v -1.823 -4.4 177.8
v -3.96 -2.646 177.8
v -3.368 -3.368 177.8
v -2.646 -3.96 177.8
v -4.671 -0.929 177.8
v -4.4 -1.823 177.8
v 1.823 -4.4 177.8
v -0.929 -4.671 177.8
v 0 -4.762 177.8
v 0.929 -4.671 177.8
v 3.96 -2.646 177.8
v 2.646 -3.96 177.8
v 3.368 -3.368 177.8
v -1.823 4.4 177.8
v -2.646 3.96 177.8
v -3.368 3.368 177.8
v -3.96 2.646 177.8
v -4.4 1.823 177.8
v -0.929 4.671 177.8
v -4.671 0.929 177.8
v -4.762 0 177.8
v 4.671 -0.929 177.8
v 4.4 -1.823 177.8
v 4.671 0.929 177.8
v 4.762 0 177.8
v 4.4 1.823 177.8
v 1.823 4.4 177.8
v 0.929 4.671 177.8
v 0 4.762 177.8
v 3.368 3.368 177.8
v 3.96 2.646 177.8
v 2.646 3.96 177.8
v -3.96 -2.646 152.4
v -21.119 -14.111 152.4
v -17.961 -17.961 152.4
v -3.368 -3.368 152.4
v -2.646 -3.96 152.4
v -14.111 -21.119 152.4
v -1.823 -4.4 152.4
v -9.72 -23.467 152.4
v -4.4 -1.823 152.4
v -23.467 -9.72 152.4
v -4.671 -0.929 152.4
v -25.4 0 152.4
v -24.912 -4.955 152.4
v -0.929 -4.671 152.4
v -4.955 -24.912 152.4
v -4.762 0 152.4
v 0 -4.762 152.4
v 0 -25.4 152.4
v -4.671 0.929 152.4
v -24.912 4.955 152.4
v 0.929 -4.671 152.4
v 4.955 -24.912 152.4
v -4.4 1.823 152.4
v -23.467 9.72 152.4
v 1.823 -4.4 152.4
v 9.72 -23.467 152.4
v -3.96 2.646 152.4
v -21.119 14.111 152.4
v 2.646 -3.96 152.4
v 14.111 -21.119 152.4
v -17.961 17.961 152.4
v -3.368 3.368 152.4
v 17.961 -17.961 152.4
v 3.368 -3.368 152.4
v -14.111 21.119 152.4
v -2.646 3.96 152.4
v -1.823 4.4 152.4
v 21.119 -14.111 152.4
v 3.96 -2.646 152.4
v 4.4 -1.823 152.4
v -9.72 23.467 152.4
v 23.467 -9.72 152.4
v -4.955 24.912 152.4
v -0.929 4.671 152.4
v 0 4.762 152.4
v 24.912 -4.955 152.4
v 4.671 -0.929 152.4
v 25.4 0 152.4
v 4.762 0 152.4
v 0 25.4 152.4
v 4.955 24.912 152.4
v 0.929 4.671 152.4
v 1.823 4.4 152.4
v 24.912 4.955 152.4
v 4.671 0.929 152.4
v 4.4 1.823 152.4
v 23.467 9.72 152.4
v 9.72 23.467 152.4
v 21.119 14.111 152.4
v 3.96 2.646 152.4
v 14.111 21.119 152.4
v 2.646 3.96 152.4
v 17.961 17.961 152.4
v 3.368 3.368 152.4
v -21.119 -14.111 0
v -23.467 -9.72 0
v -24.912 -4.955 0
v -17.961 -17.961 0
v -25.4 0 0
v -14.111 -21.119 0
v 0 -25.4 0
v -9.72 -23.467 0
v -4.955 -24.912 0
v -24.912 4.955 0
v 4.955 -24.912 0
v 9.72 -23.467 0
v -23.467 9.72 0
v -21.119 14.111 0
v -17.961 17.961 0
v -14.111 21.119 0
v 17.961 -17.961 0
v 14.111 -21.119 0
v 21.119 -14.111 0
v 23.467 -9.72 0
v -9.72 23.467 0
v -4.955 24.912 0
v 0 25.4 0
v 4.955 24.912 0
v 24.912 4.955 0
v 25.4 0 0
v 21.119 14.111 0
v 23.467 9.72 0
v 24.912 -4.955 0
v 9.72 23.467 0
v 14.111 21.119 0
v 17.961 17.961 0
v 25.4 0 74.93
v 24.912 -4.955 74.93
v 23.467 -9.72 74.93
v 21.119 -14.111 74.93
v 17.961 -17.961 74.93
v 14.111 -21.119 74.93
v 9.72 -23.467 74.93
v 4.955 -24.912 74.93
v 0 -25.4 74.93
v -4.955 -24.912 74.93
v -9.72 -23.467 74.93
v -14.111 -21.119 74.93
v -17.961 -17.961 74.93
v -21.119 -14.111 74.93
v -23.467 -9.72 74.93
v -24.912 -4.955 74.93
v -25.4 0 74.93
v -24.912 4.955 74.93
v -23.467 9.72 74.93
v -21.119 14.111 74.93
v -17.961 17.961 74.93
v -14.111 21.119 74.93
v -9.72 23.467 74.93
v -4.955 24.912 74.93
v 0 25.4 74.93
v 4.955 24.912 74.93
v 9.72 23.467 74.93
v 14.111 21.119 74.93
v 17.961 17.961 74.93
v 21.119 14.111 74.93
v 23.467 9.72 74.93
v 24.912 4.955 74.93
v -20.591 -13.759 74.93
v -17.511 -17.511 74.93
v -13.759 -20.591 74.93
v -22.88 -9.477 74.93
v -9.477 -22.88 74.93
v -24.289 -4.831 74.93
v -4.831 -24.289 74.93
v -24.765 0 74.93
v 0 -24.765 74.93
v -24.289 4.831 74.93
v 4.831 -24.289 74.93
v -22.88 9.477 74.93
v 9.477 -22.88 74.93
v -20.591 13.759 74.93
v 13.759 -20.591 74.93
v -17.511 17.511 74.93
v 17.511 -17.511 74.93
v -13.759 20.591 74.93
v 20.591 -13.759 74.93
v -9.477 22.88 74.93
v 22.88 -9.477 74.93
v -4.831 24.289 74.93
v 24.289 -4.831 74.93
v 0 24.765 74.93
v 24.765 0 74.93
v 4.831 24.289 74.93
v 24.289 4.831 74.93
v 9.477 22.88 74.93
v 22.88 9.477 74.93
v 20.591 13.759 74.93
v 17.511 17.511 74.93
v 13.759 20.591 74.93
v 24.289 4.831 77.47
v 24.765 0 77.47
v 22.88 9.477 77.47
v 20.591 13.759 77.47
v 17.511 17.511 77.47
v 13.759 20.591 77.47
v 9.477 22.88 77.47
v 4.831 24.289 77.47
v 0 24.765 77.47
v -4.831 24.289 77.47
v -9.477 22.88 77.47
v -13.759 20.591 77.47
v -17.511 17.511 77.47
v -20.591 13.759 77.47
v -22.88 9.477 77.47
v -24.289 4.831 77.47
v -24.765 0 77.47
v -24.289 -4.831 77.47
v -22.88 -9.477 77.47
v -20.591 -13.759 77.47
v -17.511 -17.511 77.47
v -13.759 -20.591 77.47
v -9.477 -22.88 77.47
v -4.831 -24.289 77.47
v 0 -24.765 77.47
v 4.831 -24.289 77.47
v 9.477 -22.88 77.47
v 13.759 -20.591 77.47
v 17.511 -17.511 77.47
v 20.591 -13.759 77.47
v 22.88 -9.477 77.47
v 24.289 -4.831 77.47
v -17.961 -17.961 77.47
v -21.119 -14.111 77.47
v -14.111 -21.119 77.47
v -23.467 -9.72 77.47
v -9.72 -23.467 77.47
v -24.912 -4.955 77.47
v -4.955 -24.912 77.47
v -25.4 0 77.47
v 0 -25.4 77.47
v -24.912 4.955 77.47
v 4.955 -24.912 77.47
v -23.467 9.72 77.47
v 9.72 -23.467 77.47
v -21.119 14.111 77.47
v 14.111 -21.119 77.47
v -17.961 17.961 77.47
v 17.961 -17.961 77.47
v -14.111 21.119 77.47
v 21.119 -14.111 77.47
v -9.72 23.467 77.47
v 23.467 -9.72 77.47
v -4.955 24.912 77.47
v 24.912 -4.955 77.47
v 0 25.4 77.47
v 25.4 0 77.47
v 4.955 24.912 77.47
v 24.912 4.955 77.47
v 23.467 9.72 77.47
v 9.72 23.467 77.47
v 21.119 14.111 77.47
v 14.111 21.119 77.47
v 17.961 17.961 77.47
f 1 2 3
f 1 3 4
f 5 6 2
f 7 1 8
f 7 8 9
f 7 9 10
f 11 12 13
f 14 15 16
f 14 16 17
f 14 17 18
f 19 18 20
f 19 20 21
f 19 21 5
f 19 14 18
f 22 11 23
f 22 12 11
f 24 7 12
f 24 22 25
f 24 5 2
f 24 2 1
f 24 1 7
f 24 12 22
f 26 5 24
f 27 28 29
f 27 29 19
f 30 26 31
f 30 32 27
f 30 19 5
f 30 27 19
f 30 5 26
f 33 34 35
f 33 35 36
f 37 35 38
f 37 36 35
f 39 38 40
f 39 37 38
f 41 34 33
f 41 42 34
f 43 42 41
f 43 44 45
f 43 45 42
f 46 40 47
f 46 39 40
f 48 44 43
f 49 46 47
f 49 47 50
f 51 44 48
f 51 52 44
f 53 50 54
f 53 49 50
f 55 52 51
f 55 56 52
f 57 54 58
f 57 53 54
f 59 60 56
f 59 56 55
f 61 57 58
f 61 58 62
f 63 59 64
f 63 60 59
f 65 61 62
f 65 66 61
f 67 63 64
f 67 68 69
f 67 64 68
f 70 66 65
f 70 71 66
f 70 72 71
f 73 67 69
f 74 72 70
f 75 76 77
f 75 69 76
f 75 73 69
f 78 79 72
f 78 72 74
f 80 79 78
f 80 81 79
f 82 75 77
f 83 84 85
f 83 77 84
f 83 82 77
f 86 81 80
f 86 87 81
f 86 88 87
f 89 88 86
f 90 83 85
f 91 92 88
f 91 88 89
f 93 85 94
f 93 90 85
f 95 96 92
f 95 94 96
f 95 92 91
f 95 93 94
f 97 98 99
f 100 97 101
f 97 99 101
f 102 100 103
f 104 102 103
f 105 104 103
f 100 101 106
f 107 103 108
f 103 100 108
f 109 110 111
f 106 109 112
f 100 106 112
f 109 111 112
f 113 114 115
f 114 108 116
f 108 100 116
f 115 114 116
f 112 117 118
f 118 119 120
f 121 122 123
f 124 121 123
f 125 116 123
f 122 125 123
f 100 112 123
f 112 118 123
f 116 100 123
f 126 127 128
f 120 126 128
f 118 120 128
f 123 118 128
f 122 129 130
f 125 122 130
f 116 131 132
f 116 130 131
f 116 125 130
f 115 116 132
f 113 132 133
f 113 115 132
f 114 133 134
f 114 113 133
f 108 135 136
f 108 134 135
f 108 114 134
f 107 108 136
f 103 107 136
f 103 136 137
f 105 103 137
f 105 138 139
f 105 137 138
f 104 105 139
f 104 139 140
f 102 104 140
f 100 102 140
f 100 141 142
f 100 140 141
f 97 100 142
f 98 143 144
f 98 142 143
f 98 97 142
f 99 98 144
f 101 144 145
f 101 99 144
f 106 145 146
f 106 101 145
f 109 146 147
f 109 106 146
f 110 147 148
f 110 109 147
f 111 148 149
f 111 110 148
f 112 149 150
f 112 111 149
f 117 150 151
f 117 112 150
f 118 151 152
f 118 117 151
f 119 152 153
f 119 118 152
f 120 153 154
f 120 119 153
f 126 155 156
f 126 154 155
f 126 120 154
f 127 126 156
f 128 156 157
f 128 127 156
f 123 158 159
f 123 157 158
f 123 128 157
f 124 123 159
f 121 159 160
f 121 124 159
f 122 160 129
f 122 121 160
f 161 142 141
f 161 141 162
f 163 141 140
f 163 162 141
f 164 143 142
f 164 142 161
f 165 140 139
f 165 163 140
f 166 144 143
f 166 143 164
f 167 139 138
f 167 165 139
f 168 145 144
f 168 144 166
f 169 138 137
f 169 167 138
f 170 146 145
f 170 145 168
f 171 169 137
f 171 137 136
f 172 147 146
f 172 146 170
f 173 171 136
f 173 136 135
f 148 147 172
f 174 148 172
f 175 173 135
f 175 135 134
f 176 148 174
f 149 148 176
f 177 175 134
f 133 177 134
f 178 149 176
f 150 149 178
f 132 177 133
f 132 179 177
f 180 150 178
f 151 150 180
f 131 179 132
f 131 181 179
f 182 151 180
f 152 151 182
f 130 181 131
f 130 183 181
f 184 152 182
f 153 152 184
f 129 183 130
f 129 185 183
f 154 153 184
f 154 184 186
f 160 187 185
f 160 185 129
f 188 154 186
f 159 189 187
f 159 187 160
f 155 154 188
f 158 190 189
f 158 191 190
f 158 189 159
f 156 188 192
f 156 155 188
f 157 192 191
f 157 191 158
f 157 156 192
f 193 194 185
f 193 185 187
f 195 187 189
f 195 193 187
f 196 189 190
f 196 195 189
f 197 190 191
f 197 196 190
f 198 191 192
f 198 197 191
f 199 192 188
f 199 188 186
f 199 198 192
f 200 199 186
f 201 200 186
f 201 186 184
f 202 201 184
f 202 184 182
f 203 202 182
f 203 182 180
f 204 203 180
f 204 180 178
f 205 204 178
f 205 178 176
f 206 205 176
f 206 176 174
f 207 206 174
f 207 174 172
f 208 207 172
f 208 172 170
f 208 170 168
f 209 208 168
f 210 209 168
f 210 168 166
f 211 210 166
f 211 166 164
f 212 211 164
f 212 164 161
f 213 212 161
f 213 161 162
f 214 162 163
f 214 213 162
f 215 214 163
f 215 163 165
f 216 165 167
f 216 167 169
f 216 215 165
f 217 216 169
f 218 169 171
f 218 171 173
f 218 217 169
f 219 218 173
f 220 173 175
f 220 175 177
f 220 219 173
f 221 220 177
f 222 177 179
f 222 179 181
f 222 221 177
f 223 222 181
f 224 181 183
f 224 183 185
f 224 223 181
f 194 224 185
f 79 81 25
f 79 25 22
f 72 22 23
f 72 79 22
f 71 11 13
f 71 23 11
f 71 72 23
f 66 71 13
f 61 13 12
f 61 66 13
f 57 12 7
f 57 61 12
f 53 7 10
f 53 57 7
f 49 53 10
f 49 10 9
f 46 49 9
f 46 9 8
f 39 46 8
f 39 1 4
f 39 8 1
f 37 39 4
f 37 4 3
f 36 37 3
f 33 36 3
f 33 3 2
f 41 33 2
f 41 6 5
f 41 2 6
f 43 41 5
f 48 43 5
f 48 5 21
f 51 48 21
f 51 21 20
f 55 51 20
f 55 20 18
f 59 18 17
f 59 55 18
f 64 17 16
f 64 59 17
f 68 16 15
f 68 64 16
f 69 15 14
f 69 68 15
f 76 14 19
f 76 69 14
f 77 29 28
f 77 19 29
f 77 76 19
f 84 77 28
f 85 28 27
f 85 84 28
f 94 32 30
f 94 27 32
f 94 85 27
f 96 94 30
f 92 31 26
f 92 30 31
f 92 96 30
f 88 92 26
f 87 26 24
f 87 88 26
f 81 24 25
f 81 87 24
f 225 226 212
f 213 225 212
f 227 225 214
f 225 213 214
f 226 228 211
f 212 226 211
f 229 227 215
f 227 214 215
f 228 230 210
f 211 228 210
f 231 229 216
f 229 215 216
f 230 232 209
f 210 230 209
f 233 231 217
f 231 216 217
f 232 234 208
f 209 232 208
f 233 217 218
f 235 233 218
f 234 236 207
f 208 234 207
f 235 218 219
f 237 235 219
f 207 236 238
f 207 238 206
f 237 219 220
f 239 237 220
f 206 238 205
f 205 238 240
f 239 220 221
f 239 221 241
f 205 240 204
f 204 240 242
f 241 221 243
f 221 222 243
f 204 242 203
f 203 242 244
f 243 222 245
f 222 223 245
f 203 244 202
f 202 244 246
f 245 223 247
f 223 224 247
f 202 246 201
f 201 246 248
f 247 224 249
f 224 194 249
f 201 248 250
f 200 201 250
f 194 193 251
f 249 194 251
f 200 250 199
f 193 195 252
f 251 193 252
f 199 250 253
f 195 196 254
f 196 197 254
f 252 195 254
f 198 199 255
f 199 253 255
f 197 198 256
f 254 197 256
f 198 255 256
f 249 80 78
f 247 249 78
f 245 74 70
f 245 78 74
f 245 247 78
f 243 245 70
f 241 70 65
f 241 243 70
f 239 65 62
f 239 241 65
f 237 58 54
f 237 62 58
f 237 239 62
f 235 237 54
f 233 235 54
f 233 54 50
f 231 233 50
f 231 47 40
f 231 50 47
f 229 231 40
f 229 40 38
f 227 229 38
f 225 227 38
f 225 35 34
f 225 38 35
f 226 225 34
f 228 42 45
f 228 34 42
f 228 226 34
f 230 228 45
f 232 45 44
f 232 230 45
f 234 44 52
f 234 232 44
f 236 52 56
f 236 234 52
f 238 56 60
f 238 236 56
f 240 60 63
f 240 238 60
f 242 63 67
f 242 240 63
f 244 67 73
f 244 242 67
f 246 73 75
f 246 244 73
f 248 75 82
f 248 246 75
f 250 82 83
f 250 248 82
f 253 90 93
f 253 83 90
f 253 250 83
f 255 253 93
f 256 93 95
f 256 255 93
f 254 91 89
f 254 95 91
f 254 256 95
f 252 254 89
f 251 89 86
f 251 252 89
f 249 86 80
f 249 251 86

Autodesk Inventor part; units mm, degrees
ref_plane "YZ Plane" through (0, 0, 0) normal (1, 0, 0) x (0, 1, 0)
ref_plane "XZ Plane" through (0, 0, 0) normal (0, 1, 0) x (-1, 0, 0)
sketch "Sketch1" plane through (0, 0, 0) normal (0, 0, 1) x (1, 0, 0)
  circle A0 centre (0, 0) radius 25.4
  dimension "d0" = 50.8
extrude "Extrusion1" add sketch "Sketch1" along normal blind 152.4
sketch "Sketch2" plane through (0, 0, 152.4) normal (0, 0, 1) x (1, 0, 0)
  circle A0 centre (0, 0) radius 25.4 projected
  circle A1 centre (0, 0) radius 4.7625
  dimension "d3" = 9.525
extrude "Extrusion2" add sketch "Sketch2" along normal blind 25.4 contours A1
ref_plane "Work Plane1" through (0, 0, 76.2) normal (0, 0, 1) x (1, 0, 0)
sketch "Sketch3" plane through (0, 0, 76.2) normal (0, 0, 1) x (1, 0, 0)
  circle A0 centre (0, 0) radius 25.4
  circle A1 centre (0, 0) radius 24.765
  dimension "d6" = 50.8
  dimension "d7" = 49.53
extrude "Extrusion3" cut sketch "Sketch3" along normal mid plane 2.54
properties part number "SmallMotor_NERDS"
